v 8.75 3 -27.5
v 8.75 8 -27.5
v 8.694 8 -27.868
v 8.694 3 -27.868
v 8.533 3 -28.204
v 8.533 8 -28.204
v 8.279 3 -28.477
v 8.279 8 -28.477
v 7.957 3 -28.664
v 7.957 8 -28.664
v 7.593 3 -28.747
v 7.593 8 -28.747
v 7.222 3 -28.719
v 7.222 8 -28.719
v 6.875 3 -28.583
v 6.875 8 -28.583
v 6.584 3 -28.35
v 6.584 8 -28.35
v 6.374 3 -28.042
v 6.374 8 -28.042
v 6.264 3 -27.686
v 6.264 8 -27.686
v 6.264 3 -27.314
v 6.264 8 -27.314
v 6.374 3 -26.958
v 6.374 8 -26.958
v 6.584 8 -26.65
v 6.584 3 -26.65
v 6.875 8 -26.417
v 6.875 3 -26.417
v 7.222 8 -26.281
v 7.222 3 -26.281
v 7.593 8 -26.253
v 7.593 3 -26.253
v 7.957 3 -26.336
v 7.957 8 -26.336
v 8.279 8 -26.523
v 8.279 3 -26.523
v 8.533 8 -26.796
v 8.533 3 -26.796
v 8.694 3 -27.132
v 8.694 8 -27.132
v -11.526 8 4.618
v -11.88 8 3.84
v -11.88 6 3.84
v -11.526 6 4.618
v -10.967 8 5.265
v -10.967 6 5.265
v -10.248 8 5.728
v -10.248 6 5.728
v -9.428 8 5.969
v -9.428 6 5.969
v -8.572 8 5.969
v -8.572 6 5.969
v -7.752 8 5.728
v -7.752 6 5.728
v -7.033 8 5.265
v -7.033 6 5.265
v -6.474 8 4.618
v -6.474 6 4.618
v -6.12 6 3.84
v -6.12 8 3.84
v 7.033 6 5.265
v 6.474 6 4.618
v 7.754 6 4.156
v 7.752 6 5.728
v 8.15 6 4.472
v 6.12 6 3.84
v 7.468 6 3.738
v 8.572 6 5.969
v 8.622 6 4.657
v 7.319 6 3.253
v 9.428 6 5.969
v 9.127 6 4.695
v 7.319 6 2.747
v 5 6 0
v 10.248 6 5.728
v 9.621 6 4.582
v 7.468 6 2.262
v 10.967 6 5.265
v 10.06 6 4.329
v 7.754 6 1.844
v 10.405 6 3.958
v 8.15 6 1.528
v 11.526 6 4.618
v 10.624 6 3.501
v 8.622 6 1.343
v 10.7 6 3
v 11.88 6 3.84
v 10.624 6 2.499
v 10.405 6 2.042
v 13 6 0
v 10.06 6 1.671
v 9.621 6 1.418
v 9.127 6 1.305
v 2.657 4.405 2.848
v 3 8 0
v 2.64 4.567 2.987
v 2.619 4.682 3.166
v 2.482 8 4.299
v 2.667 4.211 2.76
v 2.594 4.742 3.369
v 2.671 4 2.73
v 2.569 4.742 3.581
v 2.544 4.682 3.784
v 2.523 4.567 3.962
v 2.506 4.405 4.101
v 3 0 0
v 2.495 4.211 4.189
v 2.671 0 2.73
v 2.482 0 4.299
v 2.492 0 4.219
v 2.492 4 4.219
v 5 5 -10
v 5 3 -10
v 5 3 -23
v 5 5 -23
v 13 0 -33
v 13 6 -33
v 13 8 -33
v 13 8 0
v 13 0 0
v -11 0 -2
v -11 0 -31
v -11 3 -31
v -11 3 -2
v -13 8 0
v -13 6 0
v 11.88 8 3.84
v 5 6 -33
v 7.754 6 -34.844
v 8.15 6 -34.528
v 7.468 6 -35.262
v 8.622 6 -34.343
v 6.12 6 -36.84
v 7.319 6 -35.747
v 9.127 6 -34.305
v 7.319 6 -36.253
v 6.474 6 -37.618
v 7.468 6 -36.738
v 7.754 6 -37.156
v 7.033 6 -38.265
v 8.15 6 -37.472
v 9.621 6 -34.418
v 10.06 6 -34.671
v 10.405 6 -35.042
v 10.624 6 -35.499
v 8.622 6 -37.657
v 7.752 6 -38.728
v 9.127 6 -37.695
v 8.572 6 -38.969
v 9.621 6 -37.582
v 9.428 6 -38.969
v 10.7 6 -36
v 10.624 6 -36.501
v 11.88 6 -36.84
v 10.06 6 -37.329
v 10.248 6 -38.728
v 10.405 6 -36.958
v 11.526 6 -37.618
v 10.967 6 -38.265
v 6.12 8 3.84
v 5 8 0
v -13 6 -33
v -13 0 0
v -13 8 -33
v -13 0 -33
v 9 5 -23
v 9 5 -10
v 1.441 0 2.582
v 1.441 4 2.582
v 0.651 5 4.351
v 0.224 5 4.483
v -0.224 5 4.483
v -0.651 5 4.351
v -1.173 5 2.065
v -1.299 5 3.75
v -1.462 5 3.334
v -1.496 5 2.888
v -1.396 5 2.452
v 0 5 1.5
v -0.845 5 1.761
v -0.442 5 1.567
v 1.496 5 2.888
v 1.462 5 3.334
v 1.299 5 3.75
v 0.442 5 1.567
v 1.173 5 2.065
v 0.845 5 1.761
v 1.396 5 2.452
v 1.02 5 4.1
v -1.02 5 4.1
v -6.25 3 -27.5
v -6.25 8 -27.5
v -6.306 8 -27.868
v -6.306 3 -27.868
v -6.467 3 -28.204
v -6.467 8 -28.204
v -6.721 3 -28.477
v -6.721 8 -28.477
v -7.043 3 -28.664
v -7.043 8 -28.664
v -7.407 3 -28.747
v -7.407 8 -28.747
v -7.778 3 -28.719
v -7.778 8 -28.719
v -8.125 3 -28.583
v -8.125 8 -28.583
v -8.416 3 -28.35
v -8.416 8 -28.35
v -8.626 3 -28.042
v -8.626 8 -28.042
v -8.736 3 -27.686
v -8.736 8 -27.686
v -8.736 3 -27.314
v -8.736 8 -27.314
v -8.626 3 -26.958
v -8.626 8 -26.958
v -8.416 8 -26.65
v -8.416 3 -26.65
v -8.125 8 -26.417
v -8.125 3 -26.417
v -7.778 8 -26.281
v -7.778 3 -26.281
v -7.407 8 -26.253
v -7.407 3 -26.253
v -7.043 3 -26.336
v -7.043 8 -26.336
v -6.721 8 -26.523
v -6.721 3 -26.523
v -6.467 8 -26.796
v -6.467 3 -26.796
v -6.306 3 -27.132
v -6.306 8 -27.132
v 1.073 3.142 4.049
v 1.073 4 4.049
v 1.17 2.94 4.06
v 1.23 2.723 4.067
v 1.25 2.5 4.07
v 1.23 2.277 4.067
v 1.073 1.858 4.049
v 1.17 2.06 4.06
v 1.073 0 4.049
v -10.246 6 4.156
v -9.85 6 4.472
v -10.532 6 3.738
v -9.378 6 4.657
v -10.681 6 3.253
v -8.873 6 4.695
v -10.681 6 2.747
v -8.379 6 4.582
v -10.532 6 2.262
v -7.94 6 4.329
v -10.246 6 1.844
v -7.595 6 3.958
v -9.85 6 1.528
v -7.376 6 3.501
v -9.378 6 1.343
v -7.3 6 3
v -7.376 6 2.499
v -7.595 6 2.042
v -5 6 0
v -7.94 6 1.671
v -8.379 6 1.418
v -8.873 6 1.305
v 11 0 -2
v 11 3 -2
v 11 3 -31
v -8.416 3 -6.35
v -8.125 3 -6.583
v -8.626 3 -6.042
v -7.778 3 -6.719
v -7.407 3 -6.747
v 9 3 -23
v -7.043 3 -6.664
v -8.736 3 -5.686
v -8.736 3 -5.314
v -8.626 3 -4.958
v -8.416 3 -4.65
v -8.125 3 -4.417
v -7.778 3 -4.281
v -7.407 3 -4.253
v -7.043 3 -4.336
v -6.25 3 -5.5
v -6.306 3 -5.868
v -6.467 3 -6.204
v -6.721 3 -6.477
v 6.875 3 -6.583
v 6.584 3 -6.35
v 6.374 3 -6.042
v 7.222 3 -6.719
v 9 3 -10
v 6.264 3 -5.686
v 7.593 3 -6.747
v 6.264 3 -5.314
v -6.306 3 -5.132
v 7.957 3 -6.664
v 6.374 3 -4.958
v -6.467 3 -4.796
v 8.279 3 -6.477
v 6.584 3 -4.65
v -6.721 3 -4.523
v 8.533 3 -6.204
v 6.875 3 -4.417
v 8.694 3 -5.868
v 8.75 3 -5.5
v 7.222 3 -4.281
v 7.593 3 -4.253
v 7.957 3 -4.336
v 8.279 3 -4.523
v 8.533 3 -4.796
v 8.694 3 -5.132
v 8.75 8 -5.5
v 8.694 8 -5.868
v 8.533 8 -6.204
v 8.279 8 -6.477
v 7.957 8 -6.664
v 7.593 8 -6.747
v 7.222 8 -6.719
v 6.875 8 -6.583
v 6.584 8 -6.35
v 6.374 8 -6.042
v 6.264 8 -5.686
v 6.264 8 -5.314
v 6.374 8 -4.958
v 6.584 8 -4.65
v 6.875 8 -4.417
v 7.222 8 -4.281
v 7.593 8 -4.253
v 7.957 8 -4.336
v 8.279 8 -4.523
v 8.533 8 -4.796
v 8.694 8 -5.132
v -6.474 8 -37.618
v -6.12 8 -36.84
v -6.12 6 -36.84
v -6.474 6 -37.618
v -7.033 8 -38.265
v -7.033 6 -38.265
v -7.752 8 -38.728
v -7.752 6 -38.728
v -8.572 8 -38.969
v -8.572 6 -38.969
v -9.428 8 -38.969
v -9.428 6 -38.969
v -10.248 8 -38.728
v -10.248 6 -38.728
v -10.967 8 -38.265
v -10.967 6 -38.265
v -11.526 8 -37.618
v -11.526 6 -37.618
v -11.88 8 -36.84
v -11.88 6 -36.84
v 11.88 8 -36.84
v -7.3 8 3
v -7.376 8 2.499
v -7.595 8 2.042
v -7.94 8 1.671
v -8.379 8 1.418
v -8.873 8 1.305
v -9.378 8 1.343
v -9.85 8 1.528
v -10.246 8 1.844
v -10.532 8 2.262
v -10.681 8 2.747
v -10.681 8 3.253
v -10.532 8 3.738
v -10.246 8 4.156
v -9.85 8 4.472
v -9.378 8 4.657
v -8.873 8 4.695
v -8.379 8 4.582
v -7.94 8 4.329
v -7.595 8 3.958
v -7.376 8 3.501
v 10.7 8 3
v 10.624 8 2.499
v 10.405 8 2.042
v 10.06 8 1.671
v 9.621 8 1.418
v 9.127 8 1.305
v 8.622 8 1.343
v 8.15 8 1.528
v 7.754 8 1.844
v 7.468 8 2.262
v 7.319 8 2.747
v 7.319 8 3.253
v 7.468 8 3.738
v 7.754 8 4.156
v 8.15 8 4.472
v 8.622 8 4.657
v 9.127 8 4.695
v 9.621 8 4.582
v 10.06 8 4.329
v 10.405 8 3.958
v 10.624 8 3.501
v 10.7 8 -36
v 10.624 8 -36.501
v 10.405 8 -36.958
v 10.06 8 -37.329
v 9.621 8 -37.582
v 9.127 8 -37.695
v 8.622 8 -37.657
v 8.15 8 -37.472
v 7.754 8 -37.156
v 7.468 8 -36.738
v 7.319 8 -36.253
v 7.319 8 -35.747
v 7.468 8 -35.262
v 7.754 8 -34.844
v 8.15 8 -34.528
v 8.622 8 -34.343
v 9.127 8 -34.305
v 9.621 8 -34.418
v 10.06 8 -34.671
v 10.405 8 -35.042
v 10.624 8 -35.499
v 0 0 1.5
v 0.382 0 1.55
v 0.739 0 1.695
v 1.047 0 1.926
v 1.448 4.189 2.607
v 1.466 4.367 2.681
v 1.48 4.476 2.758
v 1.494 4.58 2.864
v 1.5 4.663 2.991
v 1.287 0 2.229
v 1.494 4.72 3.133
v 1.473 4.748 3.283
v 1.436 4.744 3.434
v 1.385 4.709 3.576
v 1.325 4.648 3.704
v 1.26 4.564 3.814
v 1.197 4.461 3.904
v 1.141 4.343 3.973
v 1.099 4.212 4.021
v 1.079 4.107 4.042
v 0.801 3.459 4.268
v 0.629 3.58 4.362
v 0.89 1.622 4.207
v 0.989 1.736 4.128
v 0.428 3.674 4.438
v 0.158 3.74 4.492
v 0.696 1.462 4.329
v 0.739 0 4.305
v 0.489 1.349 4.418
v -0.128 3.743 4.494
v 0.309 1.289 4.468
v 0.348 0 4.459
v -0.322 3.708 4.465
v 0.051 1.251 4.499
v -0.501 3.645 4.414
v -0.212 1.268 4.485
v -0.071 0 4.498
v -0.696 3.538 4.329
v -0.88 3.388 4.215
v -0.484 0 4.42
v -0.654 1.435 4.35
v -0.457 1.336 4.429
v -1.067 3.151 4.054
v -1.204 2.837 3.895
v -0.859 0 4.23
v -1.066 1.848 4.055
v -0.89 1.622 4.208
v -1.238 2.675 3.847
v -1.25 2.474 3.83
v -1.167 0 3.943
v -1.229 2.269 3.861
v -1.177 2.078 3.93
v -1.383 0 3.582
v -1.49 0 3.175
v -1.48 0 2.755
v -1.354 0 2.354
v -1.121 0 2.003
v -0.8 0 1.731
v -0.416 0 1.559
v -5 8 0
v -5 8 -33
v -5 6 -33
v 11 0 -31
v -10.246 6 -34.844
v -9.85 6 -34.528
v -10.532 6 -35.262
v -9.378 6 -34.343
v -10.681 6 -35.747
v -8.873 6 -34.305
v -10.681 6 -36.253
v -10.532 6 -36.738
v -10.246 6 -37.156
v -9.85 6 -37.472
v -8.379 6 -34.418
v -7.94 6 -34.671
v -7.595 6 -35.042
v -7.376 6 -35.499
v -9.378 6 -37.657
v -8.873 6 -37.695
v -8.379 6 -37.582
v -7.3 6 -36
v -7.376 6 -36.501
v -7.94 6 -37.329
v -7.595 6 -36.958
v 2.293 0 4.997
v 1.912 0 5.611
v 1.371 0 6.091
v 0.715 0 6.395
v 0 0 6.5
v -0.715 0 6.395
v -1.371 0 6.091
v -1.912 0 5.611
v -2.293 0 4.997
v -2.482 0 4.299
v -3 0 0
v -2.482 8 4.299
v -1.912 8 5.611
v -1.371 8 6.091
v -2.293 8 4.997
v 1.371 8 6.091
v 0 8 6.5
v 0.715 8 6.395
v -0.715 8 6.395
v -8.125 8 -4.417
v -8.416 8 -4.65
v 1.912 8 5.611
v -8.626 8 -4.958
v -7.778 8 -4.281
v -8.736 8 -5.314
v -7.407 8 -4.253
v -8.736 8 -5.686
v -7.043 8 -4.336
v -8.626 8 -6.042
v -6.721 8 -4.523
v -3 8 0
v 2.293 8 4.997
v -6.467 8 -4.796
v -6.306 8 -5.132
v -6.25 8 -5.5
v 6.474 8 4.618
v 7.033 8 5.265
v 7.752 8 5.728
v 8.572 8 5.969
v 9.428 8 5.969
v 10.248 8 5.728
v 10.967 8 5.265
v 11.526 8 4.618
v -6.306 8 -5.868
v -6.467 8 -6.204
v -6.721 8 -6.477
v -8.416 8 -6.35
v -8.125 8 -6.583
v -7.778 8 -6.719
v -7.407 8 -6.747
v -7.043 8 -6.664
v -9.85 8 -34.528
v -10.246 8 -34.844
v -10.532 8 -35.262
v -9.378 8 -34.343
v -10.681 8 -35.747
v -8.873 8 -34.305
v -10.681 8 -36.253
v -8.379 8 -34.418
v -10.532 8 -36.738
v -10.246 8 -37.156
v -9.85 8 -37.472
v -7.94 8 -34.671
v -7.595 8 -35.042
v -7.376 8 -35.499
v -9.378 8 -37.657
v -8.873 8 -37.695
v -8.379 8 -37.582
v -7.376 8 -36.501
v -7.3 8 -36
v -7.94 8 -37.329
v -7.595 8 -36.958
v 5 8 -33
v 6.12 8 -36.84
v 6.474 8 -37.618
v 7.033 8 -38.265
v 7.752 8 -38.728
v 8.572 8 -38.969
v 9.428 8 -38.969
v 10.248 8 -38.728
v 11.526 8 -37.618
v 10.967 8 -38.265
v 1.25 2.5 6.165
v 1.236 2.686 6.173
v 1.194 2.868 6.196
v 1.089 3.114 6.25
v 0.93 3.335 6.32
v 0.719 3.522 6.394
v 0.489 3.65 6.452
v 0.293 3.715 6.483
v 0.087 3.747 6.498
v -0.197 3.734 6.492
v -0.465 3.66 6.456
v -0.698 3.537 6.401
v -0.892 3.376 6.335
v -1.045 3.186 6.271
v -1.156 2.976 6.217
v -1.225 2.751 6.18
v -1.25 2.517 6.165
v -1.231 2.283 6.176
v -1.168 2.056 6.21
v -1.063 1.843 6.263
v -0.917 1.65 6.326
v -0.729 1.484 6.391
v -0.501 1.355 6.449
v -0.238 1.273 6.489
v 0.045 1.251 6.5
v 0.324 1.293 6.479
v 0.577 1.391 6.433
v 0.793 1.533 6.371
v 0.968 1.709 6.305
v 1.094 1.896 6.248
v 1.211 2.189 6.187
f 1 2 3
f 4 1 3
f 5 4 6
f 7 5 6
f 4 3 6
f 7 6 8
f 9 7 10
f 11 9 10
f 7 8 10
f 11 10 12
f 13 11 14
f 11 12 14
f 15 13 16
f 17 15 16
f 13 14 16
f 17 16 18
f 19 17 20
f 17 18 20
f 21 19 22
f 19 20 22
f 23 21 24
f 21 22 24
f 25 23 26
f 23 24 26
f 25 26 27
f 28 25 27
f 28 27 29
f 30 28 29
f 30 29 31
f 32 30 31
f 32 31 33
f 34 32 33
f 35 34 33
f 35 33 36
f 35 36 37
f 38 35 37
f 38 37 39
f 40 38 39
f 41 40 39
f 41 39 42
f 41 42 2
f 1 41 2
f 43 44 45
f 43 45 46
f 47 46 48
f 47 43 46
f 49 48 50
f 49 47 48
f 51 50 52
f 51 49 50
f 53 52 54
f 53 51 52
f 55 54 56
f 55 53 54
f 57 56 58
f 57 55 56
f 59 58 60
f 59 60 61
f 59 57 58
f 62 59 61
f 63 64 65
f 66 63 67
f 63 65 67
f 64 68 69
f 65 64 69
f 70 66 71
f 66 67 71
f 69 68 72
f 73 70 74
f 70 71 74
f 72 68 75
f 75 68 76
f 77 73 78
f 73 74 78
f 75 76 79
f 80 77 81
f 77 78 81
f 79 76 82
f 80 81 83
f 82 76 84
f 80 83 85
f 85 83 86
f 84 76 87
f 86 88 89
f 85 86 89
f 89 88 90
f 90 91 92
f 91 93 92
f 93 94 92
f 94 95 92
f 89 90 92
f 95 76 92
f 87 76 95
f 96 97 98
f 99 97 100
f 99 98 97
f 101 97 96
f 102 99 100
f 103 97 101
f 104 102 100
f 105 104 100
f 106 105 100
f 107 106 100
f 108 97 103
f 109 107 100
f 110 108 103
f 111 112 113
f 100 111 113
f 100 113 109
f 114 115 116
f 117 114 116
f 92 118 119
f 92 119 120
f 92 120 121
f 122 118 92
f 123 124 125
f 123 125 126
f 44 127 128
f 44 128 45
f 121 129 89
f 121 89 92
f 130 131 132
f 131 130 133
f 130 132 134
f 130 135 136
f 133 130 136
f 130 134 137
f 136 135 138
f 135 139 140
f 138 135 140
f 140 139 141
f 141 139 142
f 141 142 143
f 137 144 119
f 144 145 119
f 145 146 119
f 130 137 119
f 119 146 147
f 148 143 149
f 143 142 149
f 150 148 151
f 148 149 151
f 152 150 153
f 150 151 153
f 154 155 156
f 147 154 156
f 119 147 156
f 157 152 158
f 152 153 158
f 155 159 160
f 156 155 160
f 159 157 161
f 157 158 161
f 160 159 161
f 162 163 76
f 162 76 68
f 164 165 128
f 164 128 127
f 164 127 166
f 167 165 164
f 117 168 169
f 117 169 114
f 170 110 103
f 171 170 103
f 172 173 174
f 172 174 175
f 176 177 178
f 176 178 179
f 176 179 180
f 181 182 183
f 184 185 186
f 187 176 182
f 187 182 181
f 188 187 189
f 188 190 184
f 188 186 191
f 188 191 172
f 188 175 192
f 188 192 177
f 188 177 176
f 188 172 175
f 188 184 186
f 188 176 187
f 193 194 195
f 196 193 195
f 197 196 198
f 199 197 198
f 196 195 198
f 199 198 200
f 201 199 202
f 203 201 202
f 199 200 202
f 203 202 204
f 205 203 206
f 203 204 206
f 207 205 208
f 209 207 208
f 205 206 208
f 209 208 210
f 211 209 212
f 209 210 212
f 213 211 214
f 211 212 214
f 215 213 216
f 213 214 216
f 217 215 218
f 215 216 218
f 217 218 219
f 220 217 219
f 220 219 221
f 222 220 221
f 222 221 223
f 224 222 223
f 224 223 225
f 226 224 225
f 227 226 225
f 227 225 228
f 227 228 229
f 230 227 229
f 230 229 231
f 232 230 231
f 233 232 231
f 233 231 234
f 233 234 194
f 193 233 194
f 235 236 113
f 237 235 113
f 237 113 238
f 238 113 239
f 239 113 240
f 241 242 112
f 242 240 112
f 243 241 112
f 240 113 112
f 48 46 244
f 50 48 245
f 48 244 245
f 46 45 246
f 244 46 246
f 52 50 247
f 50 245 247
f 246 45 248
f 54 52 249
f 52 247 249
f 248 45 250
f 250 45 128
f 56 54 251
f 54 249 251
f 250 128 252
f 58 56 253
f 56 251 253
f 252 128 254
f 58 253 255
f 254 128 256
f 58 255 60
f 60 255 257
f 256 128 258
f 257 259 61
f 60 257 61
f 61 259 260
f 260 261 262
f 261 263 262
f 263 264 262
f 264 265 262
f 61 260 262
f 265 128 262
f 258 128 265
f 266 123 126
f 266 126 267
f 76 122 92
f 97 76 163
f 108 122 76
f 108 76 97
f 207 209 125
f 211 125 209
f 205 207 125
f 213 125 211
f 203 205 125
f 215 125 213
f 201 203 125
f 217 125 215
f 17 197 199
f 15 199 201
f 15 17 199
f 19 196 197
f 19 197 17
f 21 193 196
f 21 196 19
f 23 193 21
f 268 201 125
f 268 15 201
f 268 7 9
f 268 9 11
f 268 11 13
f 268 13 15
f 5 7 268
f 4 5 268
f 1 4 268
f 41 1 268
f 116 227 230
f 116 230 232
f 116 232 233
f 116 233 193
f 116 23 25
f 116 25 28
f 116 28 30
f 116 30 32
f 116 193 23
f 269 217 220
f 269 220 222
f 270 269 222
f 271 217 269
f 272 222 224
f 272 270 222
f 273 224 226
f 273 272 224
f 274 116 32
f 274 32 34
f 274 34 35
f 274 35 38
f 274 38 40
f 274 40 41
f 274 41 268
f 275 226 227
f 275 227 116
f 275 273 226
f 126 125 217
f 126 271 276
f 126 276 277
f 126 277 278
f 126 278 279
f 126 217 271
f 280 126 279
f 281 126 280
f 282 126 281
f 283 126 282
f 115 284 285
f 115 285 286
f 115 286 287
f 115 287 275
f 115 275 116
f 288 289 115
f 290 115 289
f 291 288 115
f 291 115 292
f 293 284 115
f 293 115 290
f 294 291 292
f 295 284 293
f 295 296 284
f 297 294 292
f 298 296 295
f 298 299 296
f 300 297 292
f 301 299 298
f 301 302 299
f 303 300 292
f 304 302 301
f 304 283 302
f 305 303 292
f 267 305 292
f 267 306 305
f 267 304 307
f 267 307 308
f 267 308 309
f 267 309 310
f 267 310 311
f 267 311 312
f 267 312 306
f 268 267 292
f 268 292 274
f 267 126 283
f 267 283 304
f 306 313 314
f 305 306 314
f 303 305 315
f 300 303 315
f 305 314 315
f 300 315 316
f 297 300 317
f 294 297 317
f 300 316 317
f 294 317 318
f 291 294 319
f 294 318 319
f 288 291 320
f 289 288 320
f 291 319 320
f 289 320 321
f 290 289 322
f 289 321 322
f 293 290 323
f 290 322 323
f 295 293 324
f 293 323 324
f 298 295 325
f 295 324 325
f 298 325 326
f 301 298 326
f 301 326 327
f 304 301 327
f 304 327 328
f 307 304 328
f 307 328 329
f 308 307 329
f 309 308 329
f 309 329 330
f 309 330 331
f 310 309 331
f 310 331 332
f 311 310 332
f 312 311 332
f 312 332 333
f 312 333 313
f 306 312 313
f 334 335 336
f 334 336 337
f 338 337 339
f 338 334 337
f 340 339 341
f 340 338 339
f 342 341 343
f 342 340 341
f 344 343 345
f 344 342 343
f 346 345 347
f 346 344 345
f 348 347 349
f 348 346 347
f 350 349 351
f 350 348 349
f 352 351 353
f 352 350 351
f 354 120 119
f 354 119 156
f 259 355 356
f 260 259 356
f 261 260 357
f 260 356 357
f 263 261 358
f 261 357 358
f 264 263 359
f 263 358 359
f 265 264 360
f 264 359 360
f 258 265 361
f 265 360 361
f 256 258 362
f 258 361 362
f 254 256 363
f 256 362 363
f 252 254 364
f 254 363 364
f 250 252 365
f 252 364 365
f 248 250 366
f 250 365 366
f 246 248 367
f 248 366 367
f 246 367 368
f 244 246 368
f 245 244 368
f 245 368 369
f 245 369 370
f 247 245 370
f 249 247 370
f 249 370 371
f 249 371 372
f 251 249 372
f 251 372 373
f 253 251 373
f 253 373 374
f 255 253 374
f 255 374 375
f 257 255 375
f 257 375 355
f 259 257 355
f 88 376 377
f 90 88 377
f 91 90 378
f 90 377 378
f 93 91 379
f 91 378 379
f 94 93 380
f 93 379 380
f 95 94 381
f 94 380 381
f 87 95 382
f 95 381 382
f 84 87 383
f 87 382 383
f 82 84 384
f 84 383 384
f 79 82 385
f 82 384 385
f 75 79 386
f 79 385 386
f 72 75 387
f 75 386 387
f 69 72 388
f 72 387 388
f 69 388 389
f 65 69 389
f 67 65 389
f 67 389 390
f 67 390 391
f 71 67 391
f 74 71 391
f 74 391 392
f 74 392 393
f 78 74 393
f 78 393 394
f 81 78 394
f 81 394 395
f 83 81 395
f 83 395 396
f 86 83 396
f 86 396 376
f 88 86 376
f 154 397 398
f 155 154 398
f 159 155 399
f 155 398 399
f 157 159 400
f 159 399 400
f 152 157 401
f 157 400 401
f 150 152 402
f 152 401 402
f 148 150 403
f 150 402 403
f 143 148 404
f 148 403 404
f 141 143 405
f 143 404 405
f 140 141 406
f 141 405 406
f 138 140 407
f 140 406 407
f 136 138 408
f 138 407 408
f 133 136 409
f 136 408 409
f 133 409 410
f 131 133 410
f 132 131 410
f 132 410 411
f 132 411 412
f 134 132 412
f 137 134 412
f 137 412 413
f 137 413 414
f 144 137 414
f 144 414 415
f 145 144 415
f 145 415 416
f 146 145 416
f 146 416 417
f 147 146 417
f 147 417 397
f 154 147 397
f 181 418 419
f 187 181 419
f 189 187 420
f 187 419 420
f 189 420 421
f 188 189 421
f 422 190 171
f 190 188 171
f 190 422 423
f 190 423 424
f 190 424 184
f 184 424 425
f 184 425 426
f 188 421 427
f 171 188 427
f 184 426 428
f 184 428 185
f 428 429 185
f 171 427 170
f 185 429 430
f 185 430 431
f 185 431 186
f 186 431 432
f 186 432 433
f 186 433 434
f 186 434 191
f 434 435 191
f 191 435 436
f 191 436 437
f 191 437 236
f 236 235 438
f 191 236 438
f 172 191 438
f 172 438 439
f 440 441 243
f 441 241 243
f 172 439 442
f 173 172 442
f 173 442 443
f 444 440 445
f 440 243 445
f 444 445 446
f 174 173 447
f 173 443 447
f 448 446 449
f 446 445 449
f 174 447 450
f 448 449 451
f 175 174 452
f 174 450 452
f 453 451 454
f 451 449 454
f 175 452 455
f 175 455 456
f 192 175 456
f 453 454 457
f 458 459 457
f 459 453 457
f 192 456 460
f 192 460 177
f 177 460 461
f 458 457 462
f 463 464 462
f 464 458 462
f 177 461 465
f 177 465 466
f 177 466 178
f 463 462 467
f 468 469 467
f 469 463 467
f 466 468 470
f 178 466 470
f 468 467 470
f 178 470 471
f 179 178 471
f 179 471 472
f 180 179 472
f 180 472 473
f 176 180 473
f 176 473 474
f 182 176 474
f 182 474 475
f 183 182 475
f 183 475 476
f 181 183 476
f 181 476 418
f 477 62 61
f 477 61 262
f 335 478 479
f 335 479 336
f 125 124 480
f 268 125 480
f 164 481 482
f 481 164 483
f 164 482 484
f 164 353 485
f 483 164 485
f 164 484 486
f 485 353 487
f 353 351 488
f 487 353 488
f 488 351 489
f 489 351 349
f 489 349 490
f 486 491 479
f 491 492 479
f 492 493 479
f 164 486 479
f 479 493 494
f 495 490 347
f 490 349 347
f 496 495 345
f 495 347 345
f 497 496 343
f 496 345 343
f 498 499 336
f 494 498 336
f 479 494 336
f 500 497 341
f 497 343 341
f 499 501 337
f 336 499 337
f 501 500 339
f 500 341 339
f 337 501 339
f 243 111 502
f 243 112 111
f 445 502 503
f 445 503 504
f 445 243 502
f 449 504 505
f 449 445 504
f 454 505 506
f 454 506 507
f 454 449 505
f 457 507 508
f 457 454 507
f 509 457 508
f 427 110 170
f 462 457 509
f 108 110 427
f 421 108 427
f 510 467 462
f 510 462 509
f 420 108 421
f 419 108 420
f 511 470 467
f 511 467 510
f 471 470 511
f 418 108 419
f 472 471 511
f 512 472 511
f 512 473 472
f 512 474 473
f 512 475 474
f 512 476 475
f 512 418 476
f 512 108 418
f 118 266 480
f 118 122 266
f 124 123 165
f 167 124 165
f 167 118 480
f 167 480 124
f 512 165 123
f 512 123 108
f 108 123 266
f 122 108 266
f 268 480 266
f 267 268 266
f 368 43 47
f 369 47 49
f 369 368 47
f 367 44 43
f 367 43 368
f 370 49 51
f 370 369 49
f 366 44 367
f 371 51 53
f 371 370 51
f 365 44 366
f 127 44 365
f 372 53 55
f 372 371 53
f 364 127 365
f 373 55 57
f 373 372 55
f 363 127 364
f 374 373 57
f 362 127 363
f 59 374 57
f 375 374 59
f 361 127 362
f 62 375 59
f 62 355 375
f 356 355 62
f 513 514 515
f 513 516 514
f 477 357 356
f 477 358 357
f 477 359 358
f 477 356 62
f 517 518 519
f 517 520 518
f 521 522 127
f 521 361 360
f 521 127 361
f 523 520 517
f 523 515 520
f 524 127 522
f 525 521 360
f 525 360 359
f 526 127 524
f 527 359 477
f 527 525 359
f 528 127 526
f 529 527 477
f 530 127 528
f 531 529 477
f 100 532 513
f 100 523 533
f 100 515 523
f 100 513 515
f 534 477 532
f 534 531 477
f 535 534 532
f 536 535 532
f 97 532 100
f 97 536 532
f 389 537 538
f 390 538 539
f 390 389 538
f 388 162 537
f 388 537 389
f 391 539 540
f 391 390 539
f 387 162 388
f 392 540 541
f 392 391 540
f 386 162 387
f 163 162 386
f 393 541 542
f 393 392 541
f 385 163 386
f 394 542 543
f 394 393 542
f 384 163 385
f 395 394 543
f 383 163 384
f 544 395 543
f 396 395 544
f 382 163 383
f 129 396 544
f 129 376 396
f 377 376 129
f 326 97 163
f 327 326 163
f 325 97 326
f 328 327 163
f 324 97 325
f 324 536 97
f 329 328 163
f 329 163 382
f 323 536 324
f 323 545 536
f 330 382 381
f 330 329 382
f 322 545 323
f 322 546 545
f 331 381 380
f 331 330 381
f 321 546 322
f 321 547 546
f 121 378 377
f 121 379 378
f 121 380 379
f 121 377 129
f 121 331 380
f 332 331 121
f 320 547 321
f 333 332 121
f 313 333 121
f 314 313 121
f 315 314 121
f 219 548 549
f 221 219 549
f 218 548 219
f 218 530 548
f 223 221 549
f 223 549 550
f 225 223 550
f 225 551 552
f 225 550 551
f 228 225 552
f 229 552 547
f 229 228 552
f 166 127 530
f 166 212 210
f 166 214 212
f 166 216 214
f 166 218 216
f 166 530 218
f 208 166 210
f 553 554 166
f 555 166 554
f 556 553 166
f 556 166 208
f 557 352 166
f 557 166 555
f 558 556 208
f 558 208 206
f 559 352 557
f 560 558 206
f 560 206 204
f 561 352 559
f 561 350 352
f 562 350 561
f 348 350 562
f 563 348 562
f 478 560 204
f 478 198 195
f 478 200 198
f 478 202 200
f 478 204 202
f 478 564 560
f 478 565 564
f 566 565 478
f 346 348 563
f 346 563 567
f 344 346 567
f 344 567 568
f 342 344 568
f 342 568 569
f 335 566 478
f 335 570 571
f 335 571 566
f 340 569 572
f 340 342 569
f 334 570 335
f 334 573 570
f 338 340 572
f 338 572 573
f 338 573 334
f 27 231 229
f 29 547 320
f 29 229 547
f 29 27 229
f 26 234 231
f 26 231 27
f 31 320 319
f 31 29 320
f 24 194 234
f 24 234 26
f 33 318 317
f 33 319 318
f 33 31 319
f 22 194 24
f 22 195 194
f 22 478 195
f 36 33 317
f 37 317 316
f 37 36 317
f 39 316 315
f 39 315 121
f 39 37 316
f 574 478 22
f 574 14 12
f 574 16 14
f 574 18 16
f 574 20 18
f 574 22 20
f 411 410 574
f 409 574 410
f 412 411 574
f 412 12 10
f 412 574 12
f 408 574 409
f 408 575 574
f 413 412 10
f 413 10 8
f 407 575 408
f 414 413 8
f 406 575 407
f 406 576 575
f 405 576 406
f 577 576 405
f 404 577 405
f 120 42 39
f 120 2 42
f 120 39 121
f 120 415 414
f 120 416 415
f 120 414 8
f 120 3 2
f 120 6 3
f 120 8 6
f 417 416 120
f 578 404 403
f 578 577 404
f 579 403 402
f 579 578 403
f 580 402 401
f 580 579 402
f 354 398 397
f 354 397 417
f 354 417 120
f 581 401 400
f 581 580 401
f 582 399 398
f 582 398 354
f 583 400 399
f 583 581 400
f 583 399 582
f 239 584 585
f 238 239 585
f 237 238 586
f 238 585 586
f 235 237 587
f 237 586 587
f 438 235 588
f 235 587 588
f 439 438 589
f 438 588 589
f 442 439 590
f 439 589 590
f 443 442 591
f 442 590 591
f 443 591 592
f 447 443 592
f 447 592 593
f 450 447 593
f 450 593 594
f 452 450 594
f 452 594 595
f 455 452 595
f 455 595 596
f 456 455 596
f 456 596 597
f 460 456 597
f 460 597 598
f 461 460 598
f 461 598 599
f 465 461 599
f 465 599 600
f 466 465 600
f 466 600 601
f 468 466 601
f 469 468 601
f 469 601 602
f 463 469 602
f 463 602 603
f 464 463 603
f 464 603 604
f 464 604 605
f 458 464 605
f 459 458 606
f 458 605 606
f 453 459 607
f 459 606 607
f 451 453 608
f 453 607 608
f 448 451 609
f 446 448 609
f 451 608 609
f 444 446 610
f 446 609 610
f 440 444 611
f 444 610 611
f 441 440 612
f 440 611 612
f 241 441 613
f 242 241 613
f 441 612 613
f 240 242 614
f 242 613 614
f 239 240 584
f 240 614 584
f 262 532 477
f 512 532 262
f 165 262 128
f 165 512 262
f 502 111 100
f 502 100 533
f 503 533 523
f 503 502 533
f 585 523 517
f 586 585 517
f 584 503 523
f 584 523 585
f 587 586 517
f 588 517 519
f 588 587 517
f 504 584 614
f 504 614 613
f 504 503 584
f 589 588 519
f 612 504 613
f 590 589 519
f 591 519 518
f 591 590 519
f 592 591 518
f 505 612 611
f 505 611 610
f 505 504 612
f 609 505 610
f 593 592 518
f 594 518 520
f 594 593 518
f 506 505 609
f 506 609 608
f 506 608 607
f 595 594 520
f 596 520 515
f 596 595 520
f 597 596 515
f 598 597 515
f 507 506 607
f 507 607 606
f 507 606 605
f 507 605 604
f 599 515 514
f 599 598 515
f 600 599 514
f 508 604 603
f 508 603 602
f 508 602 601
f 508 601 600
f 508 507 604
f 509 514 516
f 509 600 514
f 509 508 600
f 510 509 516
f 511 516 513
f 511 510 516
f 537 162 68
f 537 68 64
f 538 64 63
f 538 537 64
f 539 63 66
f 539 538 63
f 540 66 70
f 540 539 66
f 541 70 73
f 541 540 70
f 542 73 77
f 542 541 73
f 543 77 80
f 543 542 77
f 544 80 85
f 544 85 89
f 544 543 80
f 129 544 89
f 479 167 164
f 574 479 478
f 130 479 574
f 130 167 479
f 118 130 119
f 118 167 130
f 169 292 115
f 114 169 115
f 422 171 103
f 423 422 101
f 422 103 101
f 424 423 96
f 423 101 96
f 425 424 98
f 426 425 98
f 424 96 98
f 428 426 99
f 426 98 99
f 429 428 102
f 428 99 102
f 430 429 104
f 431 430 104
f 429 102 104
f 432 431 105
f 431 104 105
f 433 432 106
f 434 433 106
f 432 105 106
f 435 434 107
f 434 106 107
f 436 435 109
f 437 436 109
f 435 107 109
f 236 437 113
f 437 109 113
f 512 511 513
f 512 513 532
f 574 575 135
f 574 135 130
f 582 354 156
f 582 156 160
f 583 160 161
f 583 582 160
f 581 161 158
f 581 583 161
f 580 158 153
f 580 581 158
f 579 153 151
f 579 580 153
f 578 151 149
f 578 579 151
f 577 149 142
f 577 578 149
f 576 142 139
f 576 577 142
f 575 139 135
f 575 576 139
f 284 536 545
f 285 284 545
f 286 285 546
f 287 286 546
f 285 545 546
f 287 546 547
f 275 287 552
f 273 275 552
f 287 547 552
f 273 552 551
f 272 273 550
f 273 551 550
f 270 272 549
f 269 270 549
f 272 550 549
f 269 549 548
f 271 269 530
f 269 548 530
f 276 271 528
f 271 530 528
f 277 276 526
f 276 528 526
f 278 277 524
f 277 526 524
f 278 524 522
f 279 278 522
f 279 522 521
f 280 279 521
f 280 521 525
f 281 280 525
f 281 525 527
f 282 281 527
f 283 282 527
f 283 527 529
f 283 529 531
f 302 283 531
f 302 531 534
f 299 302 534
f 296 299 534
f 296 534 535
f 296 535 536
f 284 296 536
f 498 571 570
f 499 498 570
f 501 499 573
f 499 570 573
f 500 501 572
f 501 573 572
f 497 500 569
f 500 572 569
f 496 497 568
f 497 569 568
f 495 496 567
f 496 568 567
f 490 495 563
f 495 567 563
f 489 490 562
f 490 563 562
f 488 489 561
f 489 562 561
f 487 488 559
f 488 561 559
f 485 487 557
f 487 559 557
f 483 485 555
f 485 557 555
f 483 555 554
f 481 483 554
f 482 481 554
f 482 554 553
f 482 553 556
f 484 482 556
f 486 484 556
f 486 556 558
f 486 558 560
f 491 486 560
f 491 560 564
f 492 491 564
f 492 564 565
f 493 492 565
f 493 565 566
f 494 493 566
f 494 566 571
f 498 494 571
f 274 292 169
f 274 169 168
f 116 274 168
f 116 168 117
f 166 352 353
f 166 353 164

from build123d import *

# Parameters (mm, degrees)
BOSS_EXTRUDE1_DEPTH              = 8
BOSS_EXTRUDE2_DEPTH              = 2
SKETCH3_W                        = 22
SKETCH3_H                        = 29
CUT_EXTRUDE1_DEPTH               = 3
SKETCH4_R                        = 1.5
CUT_EXTRUDE2_DEPTH               = 5
TAP_DRILL_FOR_M3X0_5_TAP1_REACH  = 49.639
TAP_DRILL_FOR_M3X0_5_TAP1_BORE_R = 1.25
M3_CLEARANCE_HOLE1_D             = 3.4
TAP_DRILL_FOR_M3X0_5_TAP2_D      = 2.5
SKETCH10_W                       = 4
SKETCH10_H                       = 13
CUT_EXTRUDE3_DEPTH               = 2
CUT_EXTRUDE4_REACH               = 45.215


with BuildPart() as part:
    # Sketch1 → Boss-Extrude1 (new body)
    with BuildSketch(Plane(origin=(0, 0, 0), x_dir=(1, 0, 0), z_dir=(0, 1, 0))):
        with BuildLine():
            Line((-2.482050808, -4.299038106), (-3, 0))
            Line((-3, 0), (-13, 0))
            Line((-13, 0), (-13, 33))
            Line((-13, 33), (13, 33))
            Line((13, 33), (13, 0))
            Line((13, 0), (3, 0))
            Line((3, 0), (2.482050808, -4.299038106))
            ThreePointArc((2.482050808, -4.299038106), (0, -6.5), (-2.482050808, -4.299038106))
        make_face()
    extrude(amount=BOSS_EXTRUDE1_DEPTH)

    # Sketch2 → Boss-Extrude2 (add)
    with BuildSketch(Plane(origin=(0, 8, 0), x_dir=(1, 0, 0), z_dir=(0, 1, 0))):
        with BuildLine():
            Line((-11.88, 36.84), (-13, 33))
            Line((-13, 33), (-5, 33))
            Line((-5, 33), (-6.12, 36.84))
            ThreePointArc((-6.12, 36.84), (-9, 39), (-11.88, 36.84))
        make_face()
        with BuildLine():
            Line((5, 33), (13, 33))
            Line((13, 33), (11.88, 36.84))
            ThreePointArc((11.88, 36.84), (9, 39), (6.12, 36.84))
            Line((6.12, 36.84), (5, 33))
        make_face()
        with BuildLine():
            Line((-5, 0), (-13, 0))
            Line((-13, 0), (-11.88, -3.84))
            ThreePointArc((-11.88, -3.84), (-9, -6), (-6.12, -3.84))
            Line((-6.12, -3.84), (-5, 0))
        make_face()
        with BuildLine():
            Line((11.88, -3.84), (13, 0))
            Line((13, 0), (5, 0))
            Line((5, 0), (6.12, -3.84))
            ThreePointArc((6.12, -3.84), (9, -6), (11.88, -3.84))
        make_face()
    extrude(amount=-BOSS_EXTRUDE2_DEPTH)

    # Sketch3 → Cut-Extrude1 (cut)
    with BuildSketch(Plane.XZ):
        with Locations((0, -16.5)):
            Rectangle(SKETCH3_W, SKETCH3_H)
    extrude(amount=-CUT_EXTRUDE1_DEPTH, mode=Mode.SUBTRACT)

    # Sketch4 → Cut-Extrude2 (cut)
    with BuildSketch(Plane(origin=(0, 0, 0), x_dir=(-1, 0, 0), z_dir=(0, -1, 0))):
        with Locations(Location((0, -3, 0), (0, 0, 90))):
            Circle(SKETCH4_R)
    extrude(amount=-CUT_EXTRUDE2_DEPTH, mode=Mode.SUBTRACT)

    # Tap Drill for M3x0.5 Tap1 bore (on position points) → Tap Drill for M3x0.5 Tap1 (cut, up to next)
    with BuildSketch(Plane(origin=(0, 2.5, 6.5), x_dir=(1, 0, 0), z_dir=(0, 0, 1)), mode=Mode.PRIVATE) as tap_drill_for_m3x0_5_tap1_sk1:
        Circle(TAP_DRILL_FOR_M3X0_5_TAP1_BORE_R)
    tap_drill_for_m3x0_5_tap1_tool1 = extrude(tap_drill_for_m3x0_5_tap1_sk1.sketch, amount=-TAP_DRILL_FOR_M3X0_5_TAP1_REACH, mode=Mode.PRIVATE) & part.part
    add(tap_drill_for_m3x0_5_tap1_tool1.solids().sort_by_distance((0, 2.5, 6.5))[0], mode=Mode.SUBTRACT)

    # M3 Clearance Hole1 (through all)
    with Locations(Plane(origin=(0, 6, 0), x_dir=(-1, 0, 0), z_dir=(0, -1, 0))):
        with Locations((9, -3), (-9, -3), (9, 36), (-9, 36)):
            Hole(M3_CLEARANCE_HOLE1_D / 2)

    # Tap Drill for M3x0.5 Tap2 (through all)
    with Locations(Plane(origin=(0, 3, 0), x_dir=(-1, 0, 0), z_dir=(0, -1, 0))):
        with Locations((7.5, 5.5), (7.5, 27.5), (-7.5, 27.5), (-7.5, 5.5)):
            Hole(TAP_DRILL_FOR_M3X0_5_TAP2_D / 2)

    # Sketch10 → Cut-Extrude3 (cut)
    with BuildSketch(Plane(origin=(0, 3, 0), x_dir=(-1, 0, 0), z_dir=(0, -1, 0))):
        with Locations((-7, 16.5)):
            Rectangle(SKETCH10_W, SKETCH10_H)
    extrude(amount=-CUT_EXTRUDE3_DEPTH, mode=Mode.SUBTRACT)

    # Sketch19 → Cut-Extrude4 (cut, up to next)
    with BuildSketch(Plane(origin=(2.957076581, 0, 0.35626933), x_dir=(0.11961524227066314, 0, -0.992820323027551), z_dir=(0.9928203230275511, 0, 0.11961524227066316)), mode=Mode.PRIVATE) as cut_extrude4_sk1:
        with BuildLine():
            Line((-2.391154273, 0), (-2.391154273, 4))
            ThreePointArc((-2.391154273, 4), (-3.141154273, 4.75), (-3.891154273, 4))
            Line((-3.891154273, 4), (-3.891154273, 0))
            Line((-3.891154273, 0), (-2.391154273, 0))
        make_face()
    cut_extrude4_tool1 = extrude(cut_extrude4_sk1.sketch, amount=-CUT_EXTRUDE4_REACH, mode=Mode.PRIVATE) & part.part
    add(cut_extrude4_tool1.solids().sort_by_distance((2.581347, 2.297577, 3.474871))[0], mode=Mode.SUBTRACT)


solid = part.part
